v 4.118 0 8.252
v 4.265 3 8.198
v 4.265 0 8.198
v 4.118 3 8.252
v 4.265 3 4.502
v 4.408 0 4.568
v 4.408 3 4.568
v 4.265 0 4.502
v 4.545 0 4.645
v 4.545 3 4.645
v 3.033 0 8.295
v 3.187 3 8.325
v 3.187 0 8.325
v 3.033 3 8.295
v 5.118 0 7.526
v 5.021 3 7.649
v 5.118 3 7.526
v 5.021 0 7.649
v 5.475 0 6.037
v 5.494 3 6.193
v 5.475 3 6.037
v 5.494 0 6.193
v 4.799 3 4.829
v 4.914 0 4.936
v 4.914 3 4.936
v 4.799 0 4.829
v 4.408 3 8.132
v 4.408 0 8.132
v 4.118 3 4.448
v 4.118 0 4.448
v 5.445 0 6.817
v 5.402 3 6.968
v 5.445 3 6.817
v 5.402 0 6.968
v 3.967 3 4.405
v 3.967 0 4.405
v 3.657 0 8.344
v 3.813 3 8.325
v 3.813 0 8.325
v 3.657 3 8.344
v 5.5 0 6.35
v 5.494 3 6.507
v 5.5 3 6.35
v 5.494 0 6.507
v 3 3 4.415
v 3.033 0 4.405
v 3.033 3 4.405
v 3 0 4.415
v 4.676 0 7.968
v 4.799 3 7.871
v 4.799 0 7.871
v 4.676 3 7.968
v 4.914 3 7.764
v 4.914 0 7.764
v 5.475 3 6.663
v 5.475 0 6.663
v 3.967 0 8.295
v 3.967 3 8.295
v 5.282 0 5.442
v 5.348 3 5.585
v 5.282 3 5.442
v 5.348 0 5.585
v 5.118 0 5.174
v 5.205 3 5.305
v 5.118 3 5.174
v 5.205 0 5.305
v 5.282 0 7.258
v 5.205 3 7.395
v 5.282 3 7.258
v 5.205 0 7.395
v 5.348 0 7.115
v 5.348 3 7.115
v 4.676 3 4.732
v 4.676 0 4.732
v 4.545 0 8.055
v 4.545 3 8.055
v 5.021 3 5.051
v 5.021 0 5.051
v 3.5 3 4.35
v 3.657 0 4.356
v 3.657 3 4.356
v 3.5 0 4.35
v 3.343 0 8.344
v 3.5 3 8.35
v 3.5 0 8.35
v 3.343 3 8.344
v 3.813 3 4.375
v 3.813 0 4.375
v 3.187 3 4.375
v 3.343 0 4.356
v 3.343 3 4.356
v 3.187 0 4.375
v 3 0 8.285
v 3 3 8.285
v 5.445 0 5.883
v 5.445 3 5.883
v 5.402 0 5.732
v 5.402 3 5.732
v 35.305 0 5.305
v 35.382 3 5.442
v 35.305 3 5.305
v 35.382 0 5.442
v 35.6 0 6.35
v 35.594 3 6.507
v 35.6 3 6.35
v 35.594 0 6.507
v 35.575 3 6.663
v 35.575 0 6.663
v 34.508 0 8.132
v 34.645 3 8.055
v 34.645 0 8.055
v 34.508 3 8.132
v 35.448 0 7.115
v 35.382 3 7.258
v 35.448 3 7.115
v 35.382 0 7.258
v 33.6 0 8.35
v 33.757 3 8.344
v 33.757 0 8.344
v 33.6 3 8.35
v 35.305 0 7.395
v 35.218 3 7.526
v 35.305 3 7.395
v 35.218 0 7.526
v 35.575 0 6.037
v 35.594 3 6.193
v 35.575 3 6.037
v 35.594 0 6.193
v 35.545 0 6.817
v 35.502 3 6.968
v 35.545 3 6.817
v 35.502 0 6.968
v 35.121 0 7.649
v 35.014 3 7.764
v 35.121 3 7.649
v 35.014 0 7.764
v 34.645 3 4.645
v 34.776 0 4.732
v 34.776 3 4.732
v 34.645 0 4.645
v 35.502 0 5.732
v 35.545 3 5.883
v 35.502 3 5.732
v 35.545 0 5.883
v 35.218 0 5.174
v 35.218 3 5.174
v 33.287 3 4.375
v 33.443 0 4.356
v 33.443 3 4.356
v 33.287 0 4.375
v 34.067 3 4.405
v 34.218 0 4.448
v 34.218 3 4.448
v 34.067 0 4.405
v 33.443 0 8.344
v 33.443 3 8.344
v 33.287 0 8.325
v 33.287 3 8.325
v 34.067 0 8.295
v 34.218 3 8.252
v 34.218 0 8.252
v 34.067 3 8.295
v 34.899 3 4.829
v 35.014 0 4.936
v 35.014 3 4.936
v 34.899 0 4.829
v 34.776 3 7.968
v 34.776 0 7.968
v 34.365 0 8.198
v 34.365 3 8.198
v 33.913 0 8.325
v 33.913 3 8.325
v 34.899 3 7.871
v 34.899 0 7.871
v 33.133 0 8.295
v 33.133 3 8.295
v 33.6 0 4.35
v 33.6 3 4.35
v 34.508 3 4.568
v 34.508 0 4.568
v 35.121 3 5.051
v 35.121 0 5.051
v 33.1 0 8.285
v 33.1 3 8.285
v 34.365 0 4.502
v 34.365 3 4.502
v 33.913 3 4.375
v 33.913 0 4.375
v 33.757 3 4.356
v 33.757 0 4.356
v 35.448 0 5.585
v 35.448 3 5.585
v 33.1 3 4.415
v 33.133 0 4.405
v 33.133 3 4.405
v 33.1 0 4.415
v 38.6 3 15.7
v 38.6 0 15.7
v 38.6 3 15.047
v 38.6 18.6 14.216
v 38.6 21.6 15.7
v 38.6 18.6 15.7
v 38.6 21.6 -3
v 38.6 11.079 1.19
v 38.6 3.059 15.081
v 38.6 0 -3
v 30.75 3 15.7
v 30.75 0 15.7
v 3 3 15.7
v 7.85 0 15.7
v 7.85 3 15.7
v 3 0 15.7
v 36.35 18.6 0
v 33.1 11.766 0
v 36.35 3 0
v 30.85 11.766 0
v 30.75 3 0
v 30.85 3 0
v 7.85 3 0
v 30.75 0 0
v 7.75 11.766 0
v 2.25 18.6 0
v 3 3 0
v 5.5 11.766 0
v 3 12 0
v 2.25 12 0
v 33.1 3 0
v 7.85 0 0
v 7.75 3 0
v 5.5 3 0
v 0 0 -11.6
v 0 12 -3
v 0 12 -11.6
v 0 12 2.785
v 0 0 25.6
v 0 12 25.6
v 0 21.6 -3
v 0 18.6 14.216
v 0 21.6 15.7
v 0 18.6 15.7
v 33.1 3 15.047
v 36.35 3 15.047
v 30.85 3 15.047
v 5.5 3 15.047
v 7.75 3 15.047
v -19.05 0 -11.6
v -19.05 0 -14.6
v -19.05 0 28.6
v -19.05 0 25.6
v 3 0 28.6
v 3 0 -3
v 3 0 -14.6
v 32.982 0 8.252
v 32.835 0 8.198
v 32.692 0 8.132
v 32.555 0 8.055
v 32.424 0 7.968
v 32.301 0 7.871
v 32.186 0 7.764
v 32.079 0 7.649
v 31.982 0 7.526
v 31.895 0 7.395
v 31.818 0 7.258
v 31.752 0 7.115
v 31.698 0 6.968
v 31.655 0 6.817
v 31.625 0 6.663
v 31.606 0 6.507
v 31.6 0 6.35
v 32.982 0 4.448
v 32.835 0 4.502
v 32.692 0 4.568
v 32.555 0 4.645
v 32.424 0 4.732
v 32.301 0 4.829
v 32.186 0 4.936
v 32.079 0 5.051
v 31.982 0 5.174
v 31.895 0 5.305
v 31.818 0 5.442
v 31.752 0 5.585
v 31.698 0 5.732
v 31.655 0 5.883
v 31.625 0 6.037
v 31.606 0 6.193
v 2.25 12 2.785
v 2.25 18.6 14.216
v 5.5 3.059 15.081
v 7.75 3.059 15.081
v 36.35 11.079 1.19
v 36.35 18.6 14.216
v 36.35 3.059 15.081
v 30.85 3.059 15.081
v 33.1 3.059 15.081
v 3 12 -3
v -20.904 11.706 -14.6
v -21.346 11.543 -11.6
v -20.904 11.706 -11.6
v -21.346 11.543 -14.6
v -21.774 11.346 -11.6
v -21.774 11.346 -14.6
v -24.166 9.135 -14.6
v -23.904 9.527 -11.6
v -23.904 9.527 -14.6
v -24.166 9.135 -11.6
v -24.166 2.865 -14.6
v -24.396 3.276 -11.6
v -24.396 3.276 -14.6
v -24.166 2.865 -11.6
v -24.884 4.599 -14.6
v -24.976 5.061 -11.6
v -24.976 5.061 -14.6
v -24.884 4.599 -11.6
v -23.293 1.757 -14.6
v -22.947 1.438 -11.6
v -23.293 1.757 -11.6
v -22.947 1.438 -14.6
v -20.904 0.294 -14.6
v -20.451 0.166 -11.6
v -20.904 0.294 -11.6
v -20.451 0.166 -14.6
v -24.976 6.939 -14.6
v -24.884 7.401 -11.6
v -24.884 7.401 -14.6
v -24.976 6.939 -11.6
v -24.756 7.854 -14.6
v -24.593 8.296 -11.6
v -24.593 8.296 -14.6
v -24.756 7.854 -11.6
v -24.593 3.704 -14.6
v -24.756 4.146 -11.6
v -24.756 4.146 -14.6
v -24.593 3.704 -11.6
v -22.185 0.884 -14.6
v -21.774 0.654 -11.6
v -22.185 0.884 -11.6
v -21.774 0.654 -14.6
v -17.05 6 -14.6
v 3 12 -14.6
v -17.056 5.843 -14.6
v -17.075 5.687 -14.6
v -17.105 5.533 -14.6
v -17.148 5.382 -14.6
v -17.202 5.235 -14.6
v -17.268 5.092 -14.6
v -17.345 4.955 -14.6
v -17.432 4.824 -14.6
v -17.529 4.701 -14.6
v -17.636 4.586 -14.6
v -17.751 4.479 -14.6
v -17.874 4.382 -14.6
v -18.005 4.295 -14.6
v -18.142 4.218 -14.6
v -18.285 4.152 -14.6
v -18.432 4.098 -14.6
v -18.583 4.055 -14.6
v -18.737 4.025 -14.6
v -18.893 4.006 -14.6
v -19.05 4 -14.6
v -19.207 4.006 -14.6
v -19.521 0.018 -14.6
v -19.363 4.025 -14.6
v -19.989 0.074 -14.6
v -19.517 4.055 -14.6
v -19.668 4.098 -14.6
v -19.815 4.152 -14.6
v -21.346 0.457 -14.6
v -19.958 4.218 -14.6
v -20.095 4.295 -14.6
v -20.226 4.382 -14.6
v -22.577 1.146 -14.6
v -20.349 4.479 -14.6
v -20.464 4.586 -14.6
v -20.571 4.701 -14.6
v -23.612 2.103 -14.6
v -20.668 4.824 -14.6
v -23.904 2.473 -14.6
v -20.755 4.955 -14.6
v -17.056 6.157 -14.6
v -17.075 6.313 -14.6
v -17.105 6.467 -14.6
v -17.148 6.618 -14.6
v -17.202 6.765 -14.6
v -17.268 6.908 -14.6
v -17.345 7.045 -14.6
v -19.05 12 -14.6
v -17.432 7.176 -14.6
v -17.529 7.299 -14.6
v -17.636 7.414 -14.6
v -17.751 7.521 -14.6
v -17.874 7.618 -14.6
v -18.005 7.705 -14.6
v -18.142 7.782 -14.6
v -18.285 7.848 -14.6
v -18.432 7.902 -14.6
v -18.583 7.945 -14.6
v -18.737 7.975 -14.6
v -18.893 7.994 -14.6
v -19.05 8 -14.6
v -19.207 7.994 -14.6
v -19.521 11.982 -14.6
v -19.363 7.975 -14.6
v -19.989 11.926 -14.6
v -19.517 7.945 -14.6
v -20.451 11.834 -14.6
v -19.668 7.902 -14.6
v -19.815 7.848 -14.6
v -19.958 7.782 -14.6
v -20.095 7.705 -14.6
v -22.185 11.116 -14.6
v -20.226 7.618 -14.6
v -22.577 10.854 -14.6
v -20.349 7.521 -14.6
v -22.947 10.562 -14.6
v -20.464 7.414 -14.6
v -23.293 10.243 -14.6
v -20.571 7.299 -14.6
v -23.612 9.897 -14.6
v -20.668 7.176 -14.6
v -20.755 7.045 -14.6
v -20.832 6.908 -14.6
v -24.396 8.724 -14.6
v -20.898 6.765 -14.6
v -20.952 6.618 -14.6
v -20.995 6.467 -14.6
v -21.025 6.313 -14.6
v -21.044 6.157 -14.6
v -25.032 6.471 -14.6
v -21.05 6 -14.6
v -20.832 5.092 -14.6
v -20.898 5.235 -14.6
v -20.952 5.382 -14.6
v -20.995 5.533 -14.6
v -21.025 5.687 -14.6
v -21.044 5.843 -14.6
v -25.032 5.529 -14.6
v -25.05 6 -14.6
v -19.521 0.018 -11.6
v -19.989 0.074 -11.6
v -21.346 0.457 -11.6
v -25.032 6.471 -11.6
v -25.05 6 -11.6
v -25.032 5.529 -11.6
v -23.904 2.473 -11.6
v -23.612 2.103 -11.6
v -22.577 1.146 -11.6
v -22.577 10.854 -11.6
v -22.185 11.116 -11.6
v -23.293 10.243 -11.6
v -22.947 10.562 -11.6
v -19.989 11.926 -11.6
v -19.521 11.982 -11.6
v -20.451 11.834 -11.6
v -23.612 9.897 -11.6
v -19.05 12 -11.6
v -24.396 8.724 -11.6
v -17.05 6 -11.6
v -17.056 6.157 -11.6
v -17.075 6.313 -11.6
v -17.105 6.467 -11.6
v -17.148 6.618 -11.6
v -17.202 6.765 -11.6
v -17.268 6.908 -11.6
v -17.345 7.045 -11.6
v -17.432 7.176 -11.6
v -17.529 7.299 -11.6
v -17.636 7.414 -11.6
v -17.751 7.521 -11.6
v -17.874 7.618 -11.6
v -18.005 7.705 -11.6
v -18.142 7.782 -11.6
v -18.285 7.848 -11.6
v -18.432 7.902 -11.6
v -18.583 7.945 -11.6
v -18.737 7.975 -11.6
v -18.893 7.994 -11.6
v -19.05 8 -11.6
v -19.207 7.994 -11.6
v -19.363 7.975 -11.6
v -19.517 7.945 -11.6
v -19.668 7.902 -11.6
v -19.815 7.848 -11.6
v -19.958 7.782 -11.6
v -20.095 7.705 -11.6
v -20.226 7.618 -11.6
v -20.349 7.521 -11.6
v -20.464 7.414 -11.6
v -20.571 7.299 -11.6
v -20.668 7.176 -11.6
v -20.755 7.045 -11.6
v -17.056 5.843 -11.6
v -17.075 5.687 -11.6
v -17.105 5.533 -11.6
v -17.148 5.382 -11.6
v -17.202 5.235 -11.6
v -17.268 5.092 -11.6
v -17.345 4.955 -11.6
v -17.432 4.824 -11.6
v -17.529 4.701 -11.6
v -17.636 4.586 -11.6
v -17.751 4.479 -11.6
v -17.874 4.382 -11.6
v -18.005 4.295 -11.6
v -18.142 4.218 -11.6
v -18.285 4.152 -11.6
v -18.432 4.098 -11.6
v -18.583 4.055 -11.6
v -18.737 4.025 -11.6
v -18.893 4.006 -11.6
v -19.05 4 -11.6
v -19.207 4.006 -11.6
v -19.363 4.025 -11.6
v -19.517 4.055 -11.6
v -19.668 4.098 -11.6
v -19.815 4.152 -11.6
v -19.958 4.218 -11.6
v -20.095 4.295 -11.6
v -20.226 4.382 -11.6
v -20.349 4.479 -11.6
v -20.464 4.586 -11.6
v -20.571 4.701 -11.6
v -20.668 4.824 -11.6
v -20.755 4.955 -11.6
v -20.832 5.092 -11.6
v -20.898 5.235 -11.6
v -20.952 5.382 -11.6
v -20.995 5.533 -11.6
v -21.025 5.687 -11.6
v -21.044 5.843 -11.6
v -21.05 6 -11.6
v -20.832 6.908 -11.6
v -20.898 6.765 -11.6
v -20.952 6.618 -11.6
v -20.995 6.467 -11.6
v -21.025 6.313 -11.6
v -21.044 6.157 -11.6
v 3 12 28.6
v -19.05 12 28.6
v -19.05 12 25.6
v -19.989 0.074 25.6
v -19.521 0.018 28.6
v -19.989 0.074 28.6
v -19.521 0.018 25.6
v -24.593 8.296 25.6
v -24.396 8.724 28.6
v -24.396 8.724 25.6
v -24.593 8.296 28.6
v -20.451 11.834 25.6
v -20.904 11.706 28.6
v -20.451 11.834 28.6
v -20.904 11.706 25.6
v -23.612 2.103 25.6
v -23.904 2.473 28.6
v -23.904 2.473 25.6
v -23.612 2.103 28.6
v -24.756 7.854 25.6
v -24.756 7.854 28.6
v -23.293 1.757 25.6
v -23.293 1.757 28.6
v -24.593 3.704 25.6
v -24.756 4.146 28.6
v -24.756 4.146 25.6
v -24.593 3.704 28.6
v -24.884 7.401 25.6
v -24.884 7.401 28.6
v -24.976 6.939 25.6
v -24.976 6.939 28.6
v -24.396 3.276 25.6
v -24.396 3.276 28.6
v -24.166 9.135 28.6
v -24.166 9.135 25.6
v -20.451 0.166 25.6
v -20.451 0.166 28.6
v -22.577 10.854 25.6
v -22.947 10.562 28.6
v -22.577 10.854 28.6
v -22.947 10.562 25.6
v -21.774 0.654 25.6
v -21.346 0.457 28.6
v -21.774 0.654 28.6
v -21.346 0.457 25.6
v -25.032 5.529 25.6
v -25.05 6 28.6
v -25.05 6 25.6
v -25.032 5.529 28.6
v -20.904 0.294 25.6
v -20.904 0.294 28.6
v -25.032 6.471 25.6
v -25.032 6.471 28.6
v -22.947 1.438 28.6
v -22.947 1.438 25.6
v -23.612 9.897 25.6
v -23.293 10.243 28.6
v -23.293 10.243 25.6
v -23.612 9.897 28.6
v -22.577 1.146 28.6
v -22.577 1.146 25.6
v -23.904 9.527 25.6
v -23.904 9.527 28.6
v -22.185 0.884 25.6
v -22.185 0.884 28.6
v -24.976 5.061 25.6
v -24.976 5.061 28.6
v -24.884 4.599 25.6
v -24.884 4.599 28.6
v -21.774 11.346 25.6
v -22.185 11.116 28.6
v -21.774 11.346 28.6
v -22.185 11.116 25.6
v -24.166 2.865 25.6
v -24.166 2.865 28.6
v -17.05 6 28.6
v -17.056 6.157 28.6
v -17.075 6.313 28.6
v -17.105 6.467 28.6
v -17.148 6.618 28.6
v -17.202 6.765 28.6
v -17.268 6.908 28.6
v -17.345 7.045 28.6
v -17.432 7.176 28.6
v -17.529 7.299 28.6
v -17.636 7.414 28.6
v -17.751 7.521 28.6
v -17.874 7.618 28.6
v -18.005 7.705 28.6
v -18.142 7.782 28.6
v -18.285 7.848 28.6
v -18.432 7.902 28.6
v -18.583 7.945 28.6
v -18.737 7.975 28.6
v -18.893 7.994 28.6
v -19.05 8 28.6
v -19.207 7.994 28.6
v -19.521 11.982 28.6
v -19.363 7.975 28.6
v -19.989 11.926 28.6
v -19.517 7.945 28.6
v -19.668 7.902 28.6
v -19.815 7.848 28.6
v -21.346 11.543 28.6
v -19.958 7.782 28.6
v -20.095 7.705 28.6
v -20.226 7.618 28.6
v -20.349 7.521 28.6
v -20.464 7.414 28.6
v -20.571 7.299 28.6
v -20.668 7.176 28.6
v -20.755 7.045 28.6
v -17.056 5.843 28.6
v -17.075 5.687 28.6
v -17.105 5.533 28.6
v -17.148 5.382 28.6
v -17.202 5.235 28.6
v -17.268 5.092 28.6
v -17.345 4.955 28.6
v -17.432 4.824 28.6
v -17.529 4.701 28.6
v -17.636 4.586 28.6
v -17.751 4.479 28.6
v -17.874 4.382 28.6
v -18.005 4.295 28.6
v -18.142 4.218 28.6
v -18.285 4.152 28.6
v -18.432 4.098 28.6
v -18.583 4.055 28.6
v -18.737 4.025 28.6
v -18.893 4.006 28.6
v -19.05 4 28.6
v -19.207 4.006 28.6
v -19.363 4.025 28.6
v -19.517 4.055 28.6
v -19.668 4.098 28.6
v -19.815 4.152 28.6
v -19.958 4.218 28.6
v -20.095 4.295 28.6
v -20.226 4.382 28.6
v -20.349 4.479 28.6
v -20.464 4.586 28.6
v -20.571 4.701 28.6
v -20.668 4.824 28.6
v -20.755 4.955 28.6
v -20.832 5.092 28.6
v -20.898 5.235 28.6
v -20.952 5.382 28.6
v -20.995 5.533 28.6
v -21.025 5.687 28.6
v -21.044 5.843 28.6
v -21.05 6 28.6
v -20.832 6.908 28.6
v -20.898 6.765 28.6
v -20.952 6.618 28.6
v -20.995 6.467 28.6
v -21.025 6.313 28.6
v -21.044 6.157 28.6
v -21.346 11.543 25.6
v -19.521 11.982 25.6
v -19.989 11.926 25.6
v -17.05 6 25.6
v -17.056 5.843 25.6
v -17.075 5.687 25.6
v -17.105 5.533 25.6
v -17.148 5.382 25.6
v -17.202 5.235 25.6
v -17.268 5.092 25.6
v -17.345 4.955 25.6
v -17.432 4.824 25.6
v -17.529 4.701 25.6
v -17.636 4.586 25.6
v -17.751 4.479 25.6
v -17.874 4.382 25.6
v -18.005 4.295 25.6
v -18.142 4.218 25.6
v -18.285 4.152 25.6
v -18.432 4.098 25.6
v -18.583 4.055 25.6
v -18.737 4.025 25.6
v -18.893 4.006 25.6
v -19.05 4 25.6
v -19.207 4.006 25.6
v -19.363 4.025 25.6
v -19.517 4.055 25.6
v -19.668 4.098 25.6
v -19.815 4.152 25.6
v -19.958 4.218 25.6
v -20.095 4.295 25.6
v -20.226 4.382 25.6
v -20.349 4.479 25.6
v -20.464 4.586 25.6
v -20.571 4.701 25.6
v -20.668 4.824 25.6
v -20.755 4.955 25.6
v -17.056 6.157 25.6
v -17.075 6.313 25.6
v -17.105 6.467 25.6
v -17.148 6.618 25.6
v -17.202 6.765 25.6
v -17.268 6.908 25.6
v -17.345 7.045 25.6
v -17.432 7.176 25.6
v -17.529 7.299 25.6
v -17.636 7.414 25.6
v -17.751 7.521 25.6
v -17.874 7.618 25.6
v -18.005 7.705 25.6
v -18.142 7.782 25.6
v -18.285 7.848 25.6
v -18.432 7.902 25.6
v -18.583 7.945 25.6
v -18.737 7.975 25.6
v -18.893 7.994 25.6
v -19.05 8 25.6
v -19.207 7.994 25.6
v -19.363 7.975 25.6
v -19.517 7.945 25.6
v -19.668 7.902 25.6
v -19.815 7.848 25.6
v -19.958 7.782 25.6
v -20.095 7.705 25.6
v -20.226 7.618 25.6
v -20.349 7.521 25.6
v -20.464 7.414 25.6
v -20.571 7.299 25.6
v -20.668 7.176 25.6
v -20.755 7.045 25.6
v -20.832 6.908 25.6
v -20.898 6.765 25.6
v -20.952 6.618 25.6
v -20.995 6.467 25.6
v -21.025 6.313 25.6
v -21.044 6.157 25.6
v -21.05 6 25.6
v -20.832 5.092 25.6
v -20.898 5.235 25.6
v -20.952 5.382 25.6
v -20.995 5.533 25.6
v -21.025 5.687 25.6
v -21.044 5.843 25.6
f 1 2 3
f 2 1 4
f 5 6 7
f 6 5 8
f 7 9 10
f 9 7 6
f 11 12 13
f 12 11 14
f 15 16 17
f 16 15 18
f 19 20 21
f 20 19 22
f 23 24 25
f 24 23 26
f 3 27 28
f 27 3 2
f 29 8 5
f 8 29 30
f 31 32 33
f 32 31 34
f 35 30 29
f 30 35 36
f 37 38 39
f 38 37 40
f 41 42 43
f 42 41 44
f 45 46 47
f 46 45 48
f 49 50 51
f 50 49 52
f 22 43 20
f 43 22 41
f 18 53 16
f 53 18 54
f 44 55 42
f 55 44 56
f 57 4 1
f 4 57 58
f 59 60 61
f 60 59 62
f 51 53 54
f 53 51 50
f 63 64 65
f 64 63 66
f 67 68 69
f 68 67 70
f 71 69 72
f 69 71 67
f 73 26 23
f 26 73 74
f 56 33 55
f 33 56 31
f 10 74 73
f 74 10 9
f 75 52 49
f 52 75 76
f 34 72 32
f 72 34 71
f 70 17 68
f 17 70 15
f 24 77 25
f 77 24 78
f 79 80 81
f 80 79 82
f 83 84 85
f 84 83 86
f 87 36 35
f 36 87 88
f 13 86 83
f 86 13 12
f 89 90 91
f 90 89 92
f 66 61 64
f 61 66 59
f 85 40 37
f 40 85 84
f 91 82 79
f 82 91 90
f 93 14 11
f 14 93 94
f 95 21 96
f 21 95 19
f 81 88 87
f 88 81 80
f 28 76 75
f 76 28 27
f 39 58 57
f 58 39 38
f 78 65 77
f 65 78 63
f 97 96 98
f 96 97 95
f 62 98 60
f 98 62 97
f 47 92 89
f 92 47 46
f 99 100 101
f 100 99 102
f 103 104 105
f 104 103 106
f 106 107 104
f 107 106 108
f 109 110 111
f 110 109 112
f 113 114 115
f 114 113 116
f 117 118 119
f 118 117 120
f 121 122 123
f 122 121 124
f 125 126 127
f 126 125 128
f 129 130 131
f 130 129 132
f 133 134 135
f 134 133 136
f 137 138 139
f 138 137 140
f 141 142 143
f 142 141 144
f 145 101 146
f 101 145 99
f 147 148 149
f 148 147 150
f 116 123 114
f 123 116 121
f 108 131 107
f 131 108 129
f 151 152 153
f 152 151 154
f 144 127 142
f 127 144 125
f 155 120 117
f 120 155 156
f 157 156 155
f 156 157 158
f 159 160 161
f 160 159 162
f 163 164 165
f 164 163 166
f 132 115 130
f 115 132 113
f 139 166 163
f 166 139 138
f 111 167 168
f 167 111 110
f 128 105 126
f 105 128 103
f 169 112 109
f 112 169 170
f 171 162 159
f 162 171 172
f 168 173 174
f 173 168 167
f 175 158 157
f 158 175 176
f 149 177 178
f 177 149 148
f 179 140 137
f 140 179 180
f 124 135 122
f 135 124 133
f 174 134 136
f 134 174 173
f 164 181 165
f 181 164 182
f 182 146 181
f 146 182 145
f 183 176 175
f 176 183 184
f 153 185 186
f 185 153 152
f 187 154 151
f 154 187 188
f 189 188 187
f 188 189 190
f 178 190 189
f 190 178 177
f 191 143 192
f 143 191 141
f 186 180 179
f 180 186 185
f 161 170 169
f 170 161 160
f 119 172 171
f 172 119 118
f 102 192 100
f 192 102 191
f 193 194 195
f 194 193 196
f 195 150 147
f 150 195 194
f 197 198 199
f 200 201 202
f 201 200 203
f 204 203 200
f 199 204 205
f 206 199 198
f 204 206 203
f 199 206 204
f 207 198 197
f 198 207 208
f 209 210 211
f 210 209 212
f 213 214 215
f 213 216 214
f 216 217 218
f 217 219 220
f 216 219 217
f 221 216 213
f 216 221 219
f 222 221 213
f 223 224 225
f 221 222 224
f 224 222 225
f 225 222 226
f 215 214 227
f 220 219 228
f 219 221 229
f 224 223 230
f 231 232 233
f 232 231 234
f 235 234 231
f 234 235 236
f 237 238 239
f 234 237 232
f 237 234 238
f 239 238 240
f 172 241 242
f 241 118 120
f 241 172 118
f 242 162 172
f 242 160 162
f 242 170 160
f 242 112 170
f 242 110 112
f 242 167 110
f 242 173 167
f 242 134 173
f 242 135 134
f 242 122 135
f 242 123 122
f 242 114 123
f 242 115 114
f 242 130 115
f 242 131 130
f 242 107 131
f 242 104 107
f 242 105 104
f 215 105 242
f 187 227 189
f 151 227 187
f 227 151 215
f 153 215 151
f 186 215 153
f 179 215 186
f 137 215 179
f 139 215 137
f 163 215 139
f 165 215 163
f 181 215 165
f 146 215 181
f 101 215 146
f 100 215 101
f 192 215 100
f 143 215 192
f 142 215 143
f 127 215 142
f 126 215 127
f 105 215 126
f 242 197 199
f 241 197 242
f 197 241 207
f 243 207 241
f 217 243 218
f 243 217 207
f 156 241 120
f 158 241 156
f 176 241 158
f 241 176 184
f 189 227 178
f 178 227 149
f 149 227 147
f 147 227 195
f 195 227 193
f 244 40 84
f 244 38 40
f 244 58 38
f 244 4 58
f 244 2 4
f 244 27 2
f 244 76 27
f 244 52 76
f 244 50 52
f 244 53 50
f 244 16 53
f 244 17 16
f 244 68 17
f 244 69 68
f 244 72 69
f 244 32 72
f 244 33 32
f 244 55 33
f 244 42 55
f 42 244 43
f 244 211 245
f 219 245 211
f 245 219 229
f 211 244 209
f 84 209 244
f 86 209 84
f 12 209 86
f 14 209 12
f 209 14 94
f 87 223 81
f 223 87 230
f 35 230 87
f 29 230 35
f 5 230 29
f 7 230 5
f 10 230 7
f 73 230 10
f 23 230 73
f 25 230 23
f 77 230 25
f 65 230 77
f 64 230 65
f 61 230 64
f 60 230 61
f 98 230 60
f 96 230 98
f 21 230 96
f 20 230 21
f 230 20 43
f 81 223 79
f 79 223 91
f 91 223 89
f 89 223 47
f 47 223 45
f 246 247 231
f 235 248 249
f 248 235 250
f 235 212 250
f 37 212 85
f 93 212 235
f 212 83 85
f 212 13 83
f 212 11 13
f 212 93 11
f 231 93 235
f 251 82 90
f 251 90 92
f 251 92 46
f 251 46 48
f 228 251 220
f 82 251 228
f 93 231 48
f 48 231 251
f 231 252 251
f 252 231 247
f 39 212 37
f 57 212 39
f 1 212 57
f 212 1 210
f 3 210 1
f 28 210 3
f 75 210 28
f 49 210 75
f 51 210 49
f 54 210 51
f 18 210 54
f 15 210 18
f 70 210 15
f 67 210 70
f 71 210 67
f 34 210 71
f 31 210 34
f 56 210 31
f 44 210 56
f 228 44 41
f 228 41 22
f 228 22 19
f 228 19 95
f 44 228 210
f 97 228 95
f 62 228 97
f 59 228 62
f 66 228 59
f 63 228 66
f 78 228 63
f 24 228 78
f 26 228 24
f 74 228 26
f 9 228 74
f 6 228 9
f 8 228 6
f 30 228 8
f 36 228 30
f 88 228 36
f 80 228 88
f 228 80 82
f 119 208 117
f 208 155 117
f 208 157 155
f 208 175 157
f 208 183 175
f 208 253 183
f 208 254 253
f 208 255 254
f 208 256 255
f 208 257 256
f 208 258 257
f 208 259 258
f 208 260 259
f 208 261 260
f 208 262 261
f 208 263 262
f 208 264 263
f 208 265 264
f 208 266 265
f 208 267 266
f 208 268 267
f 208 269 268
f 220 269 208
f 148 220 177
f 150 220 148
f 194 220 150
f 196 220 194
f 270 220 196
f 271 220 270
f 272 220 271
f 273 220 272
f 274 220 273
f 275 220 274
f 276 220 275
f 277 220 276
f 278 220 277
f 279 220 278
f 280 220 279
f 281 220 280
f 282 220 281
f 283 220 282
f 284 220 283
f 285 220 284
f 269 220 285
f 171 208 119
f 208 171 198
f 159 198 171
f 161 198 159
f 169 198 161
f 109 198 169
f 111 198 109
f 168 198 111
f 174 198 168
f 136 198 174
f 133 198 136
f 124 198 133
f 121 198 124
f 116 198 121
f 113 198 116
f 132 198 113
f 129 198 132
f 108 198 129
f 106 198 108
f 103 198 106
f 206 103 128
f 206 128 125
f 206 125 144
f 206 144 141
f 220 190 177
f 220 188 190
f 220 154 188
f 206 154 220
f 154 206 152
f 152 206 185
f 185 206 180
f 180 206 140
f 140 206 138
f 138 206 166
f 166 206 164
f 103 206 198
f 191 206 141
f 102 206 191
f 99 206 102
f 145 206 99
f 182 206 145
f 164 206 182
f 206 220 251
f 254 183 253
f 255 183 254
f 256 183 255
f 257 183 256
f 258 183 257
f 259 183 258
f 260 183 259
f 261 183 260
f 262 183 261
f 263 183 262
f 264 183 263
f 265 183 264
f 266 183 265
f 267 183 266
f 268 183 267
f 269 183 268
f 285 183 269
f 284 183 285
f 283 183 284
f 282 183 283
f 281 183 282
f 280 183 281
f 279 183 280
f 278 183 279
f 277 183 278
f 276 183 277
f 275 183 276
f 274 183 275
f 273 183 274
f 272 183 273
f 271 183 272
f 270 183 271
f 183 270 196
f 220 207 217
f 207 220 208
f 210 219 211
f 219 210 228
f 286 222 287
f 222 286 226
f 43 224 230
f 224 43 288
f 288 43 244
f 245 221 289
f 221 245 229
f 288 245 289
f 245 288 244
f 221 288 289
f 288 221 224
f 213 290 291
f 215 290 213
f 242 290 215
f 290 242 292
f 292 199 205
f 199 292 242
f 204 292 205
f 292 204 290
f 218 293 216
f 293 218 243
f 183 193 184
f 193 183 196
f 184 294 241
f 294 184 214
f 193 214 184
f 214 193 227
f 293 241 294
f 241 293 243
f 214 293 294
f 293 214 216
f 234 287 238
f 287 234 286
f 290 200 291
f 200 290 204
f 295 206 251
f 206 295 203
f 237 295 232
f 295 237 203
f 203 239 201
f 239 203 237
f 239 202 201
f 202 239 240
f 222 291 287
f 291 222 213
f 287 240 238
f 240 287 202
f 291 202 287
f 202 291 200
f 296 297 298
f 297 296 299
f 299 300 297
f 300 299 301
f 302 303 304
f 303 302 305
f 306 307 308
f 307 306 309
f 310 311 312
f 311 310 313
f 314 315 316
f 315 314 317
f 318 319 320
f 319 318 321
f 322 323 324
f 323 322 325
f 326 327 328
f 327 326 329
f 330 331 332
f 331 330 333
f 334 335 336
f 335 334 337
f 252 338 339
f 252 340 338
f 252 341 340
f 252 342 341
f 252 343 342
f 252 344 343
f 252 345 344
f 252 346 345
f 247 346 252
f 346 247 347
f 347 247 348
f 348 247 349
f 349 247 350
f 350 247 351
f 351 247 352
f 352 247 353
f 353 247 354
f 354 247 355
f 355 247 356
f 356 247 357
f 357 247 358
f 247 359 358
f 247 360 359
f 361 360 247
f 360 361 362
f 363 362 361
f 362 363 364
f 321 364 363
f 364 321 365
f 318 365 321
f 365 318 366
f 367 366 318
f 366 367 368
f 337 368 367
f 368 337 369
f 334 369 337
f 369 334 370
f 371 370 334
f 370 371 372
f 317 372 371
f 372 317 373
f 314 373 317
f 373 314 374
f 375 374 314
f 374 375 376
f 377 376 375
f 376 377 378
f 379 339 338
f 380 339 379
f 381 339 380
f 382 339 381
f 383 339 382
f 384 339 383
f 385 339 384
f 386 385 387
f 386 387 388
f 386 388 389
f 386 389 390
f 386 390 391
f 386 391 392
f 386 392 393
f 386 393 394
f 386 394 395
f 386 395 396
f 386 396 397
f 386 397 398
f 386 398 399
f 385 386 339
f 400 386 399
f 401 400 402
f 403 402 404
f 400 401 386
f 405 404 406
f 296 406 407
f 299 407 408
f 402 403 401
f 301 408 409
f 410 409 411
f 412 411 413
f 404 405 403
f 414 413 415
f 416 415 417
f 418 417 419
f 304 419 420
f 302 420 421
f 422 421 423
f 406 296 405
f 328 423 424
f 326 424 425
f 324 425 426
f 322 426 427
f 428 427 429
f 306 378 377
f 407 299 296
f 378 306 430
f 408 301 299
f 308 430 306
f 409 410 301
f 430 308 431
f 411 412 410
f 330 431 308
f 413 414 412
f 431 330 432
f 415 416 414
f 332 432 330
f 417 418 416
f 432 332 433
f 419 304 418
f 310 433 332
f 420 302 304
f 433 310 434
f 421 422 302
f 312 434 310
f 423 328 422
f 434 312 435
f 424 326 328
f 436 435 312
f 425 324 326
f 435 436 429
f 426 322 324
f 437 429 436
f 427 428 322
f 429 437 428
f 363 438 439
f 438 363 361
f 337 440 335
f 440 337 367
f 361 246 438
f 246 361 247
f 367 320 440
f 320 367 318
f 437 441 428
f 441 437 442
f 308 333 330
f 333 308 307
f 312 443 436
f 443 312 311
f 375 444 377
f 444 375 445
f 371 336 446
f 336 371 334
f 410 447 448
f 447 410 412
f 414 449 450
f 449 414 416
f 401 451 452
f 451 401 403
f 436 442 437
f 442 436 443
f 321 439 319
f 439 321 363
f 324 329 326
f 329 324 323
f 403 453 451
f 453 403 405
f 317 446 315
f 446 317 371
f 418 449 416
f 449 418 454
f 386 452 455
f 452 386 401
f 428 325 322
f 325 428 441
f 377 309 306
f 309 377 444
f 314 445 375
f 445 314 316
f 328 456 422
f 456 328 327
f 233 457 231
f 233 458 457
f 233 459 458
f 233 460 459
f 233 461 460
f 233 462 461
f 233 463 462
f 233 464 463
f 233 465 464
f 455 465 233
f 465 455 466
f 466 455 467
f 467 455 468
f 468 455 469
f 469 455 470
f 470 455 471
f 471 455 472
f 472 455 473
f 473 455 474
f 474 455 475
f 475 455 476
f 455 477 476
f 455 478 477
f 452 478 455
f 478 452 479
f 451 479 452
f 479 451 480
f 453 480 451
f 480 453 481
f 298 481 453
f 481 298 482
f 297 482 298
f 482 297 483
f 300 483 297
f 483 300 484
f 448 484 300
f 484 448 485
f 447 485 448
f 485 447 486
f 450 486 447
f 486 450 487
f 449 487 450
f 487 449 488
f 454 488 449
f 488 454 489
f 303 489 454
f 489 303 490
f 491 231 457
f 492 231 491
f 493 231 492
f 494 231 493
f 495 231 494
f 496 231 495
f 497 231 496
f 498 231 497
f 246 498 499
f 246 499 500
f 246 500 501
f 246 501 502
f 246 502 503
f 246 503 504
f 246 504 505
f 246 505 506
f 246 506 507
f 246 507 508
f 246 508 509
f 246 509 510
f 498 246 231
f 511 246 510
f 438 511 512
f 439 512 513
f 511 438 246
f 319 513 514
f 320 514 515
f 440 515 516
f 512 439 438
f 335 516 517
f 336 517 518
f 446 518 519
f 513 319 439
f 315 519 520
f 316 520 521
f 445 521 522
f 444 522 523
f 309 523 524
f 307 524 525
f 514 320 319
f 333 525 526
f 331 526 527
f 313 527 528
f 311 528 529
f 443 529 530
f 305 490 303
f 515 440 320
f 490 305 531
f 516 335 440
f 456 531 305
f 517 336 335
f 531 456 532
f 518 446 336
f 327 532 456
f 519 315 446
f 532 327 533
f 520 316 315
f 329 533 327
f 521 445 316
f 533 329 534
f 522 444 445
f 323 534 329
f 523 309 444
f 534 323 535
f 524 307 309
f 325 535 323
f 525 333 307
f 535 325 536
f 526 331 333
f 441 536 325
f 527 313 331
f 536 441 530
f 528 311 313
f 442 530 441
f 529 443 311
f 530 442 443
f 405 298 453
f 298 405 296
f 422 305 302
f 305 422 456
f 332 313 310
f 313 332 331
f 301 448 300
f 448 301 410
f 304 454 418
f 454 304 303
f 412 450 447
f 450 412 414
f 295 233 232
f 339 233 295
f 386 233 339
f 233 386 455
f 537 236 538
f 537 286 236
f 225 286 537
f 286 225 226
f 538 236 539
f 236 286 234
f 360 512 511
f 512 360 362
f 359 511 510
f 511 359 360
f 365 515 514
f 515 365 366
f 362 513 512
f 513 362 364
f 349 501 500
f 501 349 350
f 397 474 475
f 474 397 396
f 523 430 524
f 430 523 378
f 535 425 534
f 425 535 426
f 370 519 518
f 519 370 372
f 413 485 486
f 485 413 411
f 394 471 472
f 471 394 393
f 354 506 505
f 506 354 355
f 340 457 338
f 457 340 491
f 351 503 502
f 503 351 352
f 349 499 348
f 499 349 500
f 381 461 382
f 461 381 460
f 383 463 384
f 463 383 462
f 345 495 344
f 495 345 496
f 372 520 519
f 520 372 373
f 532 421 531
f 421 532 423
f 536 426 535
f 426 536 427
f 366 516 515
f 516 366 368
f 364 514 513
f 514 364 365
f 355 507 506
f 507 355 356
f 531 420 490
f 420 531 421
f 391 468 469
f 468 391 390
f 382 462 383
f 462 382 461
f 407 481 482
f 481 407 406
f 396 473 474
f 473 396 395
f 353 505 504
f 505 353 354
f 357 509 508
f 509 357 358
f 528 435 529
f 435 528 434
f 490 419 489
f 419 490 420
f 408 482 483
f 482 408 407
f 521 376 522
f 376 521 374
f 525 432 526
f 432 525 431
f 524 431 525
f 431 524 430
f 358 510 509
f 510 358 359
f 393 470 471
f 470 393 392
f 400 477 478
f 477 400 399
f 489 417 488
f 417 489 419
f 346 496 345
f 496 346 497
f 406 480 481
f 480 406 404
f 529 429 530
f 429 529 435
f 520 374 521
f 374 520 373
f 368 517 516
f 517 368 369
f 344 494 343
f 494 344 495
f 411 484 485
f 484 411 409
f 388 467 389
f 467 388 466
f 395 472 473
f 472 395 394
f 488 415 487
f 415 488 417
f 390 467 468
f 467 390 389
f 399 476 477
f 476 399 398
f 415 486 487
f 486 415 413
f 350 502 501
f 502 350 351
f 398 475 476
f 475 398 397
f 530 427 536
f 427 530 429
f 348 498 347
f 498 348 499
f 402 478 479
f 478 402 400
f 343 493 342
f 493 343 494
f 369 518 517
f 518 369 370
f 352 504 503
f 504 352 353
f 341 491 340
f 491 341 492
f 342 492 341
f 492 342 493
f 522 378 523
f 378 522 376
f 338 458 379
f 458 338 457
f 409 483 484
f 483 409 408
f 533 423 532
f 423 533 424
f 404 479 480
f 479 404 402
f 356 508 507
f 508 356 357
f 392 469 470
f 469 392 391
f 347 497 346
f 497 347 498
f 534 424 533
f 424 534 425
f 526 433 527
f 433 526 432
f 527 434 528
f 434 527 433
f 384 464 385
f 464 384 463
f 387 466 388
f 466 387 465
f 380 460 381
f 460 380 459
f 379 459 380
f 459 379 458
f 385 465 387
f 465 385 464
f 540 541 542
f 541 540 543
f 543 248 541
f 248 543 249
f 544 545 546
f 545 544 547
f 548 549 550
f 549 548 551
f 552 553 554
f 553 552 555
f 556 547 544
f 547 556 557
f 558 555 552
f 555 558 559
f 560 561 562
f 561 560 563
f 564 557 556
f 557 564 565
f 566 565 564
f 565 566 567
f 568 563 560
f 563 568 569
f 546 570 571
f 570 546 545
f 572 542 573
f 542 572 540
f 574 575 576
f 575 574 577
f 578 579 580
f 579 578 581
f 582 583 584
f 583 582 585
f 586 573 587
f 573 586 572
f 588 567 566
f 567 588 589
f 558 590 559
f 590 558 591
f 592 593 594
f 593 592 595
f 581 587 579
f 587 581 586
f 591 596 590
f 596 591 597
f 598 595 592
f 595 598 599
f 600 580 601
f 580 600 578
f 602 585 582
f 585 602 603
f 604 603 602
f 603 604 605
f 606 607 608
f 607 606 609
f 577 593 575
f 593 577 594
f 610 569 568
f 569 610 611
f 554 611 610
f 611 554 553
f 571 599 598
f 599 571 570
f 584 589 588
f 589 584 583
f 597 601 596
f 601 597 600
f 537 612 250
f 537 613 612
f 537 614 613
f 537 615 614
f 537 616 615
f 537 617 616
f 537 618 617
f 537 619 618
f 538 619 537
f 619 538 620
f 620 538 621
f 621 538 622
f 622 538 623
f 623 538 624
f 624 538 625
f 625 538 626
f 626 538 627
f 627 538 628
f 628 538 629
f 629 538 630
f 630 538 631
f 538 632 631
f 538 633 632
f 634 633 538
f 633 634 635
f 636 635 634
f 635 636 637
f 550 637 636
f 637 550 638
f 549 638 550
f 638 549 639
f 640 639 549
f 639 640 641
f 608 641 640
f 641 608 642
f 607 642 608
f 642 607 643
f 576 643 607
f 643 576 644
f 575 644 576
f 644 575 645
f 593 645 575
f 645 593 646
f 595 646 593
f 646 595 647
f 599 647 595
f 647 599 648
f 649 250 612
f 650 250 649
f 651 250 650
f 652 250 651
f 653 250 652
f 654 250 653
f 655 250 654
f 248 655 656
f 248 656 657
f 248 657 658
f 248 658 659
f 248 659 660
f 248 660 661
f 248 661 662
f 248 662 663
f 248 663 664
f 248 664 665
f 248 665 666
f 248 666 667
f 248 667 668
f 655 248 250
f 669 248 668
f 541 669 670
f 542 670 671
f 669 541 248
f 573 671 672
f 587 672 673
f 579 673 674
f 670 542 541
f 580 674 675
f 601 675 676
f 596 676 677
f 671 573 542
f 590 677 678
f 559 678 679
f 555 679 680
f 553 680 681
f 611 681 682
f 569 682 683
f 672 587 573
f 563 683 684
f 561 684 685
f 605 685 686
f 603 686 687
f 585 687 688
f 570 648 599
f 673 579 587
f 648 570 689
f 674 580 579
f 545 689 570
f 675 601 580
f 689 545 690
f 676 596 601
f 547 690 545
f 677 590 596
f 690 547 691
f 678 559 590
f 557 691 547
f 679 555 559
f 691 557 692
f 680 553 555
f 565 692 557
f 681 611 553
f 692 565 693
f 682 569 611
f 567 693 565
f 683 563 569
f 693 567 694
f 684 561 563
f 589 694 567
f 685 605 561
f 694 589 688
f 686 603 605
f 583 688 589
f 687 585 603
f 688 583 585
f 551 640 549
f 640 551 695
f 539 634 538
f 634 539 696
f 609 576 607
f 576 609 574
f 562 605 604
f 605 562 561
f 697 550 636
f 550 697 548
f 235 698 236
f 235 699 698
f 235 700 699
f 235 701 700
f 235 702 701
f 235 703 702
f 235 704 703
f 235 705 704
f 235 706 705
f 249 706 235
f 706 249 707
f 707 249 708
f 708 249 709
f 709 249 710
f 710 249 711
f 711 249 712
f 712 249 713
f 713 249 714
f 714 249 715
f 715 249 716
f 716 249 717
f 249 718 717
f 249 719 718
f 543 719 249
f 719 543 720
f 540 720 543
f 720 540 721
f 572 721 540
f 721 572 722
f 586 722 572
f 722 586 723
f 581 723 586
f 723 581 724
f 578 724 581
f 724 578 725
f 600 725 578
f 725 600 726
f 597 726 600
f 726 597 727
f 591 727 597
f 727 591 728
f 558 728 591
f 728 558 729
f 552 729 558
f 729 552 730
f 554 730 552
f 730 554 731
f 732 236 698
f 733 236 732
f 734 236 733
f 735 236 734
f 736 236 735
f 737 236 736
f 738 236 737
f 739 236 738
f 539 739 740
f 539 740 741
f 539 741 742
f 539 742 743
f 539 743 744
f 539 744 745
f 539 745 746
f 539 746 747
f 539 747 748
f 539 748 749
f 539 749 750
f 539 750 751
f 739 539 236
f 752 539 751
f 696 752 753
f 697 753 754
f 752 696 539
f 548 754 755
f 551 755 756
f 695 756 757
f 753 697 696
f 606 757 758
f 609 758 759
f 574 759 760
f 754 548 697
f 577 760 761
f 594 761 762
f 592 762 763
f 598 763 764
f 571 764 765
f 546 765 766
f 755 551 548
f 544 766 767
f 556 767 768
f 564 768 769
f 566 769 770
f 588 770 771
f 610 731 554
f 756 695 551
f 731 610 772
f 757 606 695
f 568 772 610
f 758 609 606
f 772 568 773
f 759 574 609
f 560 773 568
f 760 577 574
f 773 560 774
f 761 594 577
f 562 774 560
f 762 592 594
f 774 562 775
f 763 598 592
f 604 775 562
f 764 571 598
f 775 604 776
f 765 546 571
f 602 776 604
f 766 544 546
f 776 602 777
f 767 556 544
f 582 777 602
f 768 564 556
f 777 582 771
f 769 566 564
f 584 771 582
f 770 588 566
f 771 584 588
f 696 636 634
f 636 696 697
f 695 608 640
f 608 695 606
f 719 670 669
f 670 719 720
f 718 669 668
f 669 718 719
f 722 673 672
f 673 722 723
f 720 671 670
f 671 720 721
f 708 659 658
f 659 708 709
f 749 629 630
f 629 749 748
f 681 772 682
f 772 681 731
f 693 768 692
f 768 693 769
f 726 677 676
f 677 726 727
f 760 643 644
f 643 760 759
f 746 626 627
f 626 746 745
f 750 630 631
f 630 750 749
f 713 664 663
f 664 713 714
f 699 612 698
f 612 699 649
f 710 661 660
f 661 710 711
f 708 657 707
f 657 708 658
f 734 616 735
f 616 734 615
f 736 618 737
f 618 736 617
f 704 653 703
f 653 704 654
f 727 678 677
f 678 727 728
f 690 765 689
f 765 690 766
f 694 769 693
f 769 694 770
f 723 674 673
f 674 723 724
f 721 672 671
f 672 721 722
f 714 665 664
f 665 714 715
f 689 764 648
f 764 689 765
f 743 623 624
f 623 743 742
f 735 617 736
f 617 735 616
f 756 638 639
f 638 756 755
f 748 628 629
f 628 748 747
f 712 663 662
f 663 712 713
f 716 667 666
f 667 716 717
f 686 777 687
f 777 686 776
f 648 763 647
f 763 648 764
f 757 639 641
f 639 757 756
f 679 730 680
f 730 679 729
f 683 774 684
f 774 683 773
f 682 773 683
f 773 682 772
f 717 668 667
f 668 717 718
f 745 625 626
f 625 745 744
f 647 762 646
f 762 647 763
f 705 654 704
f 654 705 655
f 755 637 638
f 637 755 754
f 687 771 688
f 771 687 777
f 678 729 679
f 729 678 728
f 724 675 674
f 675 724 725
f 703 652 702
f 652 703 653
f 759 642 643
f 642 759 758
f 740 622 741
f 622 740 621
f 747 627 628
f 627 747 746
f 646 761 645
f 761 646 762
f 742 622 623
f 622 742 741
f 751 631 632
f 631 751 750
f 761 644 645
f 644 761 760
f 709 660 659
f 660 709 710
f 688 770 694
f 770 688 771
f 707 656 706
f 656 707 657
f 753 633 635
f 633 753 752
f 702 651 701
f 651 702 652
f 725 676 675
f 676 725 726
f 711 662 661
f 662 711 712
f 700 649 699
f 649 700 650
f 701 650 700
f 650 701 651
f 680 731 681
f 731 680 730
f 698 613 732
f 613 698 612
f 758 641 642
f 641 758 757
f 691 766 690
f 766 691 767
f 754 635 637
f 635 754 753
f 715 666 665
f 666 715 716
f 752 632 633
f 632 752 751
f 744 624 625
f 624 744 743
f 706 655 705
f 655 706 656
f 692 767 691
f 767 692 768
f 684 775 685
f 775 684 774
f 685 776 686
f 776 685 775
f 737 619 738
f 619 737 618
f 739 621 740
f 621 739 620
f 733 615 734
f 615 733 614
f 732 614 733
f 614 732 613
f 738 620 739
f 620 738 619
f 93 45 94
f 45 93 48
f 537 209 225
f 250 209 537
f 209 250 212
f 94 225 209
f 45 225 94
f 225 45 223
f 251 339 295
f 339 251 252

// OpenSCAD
// file: servo_bracket_modules.scad
//standard hobby servo dimensions - don't change
A = 19.82;
B = 13.47;
C = 33.79;
D = 10.17;
E = 9.66;
F = 30.22;
G = 11.68;
H = 26.67;
J = 52.84;

//guesses
K=5.8;
M=40;
X=3.5;

//mini hobby servo dimensions
A = 12.7;
B = 8.5;
C = 28.6 - B;
D = 0;
E = 6;
F = 22.9 - E;
G = 10.6;
H = 15.6;
J = 32.1;
K = G;
M = 23.4;
X = 3;

//thickness of the bracket parts
thickness = 3;

module pinhole( x, y, z ){
	translate([x,y,z]){
		rotate(90,[1,0,0]){
			cylinder(h=thickness+2,r=1, $fn=10);
		}
	}
}

module pivothole( x, y, z ){

	translate([x,y,z]){
		rotate(90,[1,0,0]){
			cylinder(h=thickness+2,r=2, $fn=80);
		}
	}
}

module mountpoint( x, y, z ){
		//one pivot hole in the center
		pivothole( x, y, z );

		//four mount holes
		/*
		pinhole_distance = 4.5;
		pinhole( x+pinhole_distance, y, z );
		pinhole( x-pinhole_distance, y, z );
		pinhole( x, y, z+pinhole_distance );
		pinhole( x, y, z-pinhole_distance );
		*/
}

module servo_bracket()
{
	//front plate
	//======
	difference(){
		cube( size=[ B+C+10, thickness, A+thickness ] );

		translate( [ ((B+C+10)-(E+F))/2, -1, 0] ){
			cube( size=[ E+F, thickness*2, A+thickness ] );
		}

		translate( [ 0, thickness+1, 0] ){
			//two mounting holes
			pivothole( B-5, 0, A/2 );
			pivothole( (B+C)+5, 0, A/2 );
		}
	}

	//supports
	//======
	support_length = sqrt( (pow(A+thickness,2))+(pow((H/2),2)) );
	support_width = sqrt( (pow(A,2))-(pow((support_length/2),2)) );

	difference(){
		union(){
			rotate( 30, [1,0,0] ){
				translate( [ 0, 1, -6 ] ){
					cube( size=[ thickness*0.75 , support_width, support_length ] );
				}
			}
			rotate( 30, [1,0,0] ){
				translate( [ 5.5, 1, -6 ] ){
					cube( size=[ thickness*0.75 , support_width, support_length ] );
				}
			}
			rotate( 30, [1,0,0] ){
				translate( [ (B+C+10)-thickness*0.75, 1, -6 ] ){
					cube( size=[ thickness*0.75 , support_width, support_length ] );
				}
			}
			rotate( 30, [1,0,0] ){
				translate( [ (B+C+10)-thickness*0.75-5.5, 1, -6 ] ){
					cube( size=[ thickness*0.75 , support_width, support_length ] );
				}
			}
			rotate( -30, [1,0,0] ){
				translate( [ 0, 9, 5 ] ){
					cube( size=[ thickness*0.75 , support_width, support_length ] );
				}
			}
			rotate( -30, [1,0,0] ){
				translate( [  (B+C+10)-thickness*0.75, 9, 5 ] ){
					cube( size=[ thickness*0.75 , support_width, support_length ] );
				}
			}
		}

		//big blocks to subtract off the corners sticking out
		union(){
			translate( [ 0, 0, -((thickness+2)*2+thickness) ] ){
				cube( size=[ B+C+10, H+(thickness*2), (thickness+2)*2 ] );
			}
			translate( [ 0, -(thickness+2), -thickness ] ){
				cube( size=[ B+C+10, thickness+2, A+thickness+thickness ] );
			}
			translate( [ 0, H+thickness*2, -thickness ] ){
				cube( size=[ B+C+10, thickness+thickness, A+thickness+thickness ] );
			}
		}
	}

	//back plate
	//======
	difference(){
		translate( [0, H+thickness, 0] ){
			cube( size=[ B+C+10, thickness, A+thickness ] );
		}

		//pivot holes behind servo
		//mountpoint( B+5, H+(thickness*2)+1, A/2 );
		//mountpoint( (B+C+10)-(B+5), H+(thickness*2)+1, A/2 );
	}

	//base
	//======
	difference(){
		union(){
			translate( [ 0, 0, -thickness ] ){
				cube( size=[ B+C+10, H+(thickness*2), thickness ] );
			}
		}
		/*
		union(){
			rotate( 90, [1,0,0]){
				mountpoint( B+5, 1, -(H/2)-thickness );
				mountpoint( (B+C+10)-(B+5), 1, -(H/2)-thickness );
			}
		}
		*/
	}
}


module servo_bracket_C()
{

//length of the bracket (fudge takes into account extra room for horns, washers, etc)
fudge=2;
bracket_length = H+G+X+(thickness*2)+(thickness*2)+fudge;

//heigh of the bracket
bracket_height = A*1.5;

//width of the bracket
bracket_width = E*2;

	//front plate
	//======
	difference(){
		union(){
			translate( [ bracket_width/2, thickness, bracket_height ] ){
				rotate( 90, [ 1, 0, 0 ] ){
					cylinder( h=thickness, r=bracket_width/2, $fn=80 );
				}
			}
			cube( size=[ bracket_width, thickness, bracket_height ] );
		}

		mountpoint( bracket_width/2, thickness+1, bracket_height );
	}

	//back plate
	//======
	difference(){
		union(){
			translate( [ bracket_width/2, bracket_length, bracket_height ] ){
				rotate( 90, [ 1, 0, 0 ] ){
					cylinder( h=thickness, r=bracket_width/2, $fn=80 );
				}
			}
			translate( [ 0, bracket_length-thickness, 0 ] ){
				cube( size=[ bracket_width, thickness, bracket_height ] );
			}
		}

		//mount point behind servo
		mountpoint( bracket_width/2, bracket_length+1, bracket_height );
	}

	//base
	//======
	difference(){
		translate( [ 0, 0, -thickness ] ){
			cube( size=[ bracket_width, bracket_length, thickness ] );
		}
		/*
		rotate( 90, [ 1, 0, 0 ] ){
			mountpoint( bracket_width/2, 1, -bracket_length/2 );
		}
		*/
	}
}


module mockup(){
	servo_bracket();

	
	translate( [ -thickness, -thickness*3, E*2 ] ){
		rotate( 90, [0,1,0] ){
			servo_bracket_C();
		}
	}
	
}

//mockup();
// main file
include <servo_bracket_modules.scad>


module servo_bracket_lower_leg_right(){

	difference(){
		union(){
			//standard bracket
			servo_bracket();

			//C bracket connects to ankle below
			translate( [ 0, E*2, -(H+G+X)/2 ] ){
				rotate( 90, [1,0,0] ){
				rotate( -90, [0,1,0] ){
					servo_bracket_C();
				}
				}
			}
		}
	}

}

module servo_bracket_lower_leg_left(){

	mirror( [ 0, 1, 0 ] ){
		servo_bracket_lower_leg_right();
	}
}


servo_bracket_lower_leg_right();
